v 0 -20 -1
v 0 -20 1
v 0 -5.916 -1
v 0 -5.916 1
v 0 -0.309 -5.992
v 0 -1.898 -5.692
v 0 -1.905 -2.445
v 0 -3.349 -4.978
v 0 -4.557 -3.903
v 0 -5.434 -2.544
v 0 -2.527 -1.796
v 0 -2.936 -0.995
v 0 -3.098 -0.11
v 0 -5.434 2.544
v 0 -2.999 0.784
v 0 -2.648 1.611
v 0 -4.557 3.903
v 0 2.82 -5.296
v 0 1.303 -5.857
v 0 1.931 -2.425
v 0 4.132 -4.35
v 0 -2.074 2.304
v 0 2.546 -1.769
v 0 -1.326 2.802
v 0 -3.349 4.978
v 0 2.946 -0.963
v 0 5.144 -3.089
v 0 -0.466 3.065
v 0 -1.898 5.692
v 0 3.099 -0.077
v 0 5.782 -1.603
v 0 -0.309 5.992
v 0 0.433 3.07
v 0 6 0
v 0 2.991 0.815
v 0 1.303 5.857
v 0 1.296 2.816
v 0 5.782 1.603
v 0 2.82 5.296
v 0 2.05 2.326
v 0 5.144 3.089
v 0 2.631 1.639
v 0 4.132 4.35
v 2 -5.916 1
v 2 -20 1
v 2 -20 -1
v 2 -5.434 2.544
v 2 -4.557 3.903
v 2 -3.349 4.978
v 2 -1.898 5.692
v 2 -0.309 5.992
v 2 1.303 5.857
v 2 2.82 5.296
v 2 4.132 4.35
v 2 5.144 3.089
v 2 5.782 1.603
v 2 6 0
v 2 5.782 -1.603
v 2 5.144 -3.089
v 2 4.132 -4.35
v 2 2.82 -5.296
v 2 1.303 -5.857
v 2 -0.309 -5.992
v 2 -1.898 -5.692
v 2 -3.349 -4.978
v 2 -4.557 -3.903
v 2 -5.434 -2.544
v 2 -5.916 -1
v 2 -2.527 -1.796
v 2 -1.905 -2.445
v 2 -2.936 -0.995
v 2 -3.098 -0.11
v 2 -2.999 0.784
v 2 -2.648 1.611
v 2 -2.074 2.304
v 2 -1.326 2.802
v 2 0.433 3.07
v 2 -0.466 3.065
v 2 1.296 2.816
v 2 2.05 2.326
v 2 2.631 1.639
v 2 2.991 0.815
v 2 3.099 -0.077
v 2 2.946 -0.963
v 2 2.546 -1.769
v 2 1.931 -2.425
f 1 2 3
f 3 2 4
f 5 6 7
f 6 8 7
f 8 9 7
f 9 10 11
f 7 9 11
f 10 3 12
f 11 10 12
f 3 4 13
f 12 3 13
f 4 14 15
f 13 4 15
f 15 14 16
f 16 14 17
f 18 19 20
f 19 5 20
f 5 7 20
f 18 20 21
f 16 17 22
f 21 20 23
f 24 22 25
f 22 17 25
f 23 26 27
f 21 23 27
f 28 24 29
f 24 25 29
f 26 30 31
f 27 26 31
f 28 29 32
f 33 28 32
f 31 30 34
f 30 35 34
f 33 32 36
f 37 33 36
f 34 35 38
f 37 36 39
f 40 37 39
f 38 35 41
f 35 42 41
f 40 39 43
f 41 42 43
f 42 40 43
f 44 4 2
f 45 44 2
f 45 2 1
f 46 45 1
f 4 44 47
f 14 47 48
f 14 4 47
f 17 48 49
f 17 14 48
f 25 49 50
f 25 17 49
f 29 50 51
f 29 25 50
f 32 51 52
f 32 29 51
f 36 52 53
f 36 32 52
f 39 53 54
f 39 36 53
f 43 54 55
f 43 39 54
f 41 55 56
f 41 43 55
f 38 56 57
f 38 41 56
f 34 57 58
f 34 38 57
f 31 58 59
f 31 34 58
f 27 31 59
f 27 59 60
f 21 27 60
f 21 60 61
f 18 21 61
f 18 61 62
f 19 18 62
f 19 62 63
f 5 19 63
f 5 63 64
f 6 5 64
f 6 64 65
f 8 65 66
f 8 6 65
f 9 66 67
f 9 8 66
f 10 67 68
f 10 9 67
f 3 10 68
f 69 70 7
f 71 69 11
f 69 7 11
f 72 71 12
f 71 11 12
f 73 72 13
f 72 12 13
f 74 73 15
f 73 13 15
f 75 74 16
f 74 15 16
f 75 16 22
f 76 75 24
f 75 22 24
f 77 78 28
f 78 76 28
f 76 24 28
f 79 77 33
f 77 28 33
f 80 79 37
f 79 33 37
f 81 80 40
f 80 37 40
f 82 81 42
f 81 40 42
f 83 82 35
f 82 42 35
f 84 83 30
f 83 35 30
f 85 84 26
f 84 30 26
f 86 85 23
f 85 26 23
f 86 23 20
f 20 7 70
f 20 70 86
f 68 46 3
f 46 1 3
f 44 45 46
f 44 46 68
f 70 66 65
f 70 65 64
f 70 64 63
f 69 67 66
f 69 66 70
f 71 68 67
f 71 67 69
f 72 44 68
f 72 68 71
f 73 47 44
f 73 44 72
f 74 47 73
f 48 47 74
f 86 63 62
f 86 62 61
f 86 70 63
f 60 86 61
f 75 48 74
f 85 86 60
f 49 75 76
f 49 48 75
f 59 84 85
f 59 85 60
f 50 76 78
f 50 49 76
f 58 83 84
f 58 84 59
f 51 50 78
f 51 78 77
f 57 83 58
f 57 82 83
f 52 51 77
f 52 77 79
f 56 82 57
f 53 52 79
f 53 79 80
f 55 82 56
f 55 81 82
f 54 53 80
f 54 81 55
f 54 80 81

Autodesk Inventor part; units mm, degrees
ref_plane "YZ Plane" through (0, 0, 0) normal (1, 0, 0) x (0, 1, 0)
ref_plane "XZ Plane" through (0, 0, 0) normal (0, 1, 0) x (-1, 0, 0)
ref_plane "XY Plane" through (0, 0, 0) normal (0, 0, 1) x (1, 0, 0)
sketch "Sketch1" plane through (0, 0, 0) normal (1, 0, 0) x (0, 1, 0)
  arc A0 (1.9313, -2.4249) -> (-1.9054, -2.4453) centre (0, 0) ccw
  circle A1 centre (0, 0) radius 6
  line L0 (-3.1, 0) -> (-3.1, 2) construction
  line L1 (-1.9054, -2.4453) -> (1.9313, -2.4249)
  line L2 (0, 1) -> (-20, 1)
  line L3 (-20, 1) -> (-20, -1)
  line L4 (-20, -1) -> (0, -1)
  line L5 (0, -1) -> (0, 1)
  point P0 (-5.9161, -1)
  point P1 (-5.9161, 1)
  dimension "d0" = 6.2
  dimension "d1" = 12
  dimension "d2" = 2
  dimension "d5" = 1
  dimension "d6" = 2
  dimension "d7" = 20
extrude "Extrusion1" add sketch "Sketch1" along normal blind 2 contours A0 L2 A1 L4 L1 | A0 L4 A1 L2 | A1 L4 L3 L2
equation "\"d6\" = 2 * d5"
properties part number "tarcza krańcówek"
